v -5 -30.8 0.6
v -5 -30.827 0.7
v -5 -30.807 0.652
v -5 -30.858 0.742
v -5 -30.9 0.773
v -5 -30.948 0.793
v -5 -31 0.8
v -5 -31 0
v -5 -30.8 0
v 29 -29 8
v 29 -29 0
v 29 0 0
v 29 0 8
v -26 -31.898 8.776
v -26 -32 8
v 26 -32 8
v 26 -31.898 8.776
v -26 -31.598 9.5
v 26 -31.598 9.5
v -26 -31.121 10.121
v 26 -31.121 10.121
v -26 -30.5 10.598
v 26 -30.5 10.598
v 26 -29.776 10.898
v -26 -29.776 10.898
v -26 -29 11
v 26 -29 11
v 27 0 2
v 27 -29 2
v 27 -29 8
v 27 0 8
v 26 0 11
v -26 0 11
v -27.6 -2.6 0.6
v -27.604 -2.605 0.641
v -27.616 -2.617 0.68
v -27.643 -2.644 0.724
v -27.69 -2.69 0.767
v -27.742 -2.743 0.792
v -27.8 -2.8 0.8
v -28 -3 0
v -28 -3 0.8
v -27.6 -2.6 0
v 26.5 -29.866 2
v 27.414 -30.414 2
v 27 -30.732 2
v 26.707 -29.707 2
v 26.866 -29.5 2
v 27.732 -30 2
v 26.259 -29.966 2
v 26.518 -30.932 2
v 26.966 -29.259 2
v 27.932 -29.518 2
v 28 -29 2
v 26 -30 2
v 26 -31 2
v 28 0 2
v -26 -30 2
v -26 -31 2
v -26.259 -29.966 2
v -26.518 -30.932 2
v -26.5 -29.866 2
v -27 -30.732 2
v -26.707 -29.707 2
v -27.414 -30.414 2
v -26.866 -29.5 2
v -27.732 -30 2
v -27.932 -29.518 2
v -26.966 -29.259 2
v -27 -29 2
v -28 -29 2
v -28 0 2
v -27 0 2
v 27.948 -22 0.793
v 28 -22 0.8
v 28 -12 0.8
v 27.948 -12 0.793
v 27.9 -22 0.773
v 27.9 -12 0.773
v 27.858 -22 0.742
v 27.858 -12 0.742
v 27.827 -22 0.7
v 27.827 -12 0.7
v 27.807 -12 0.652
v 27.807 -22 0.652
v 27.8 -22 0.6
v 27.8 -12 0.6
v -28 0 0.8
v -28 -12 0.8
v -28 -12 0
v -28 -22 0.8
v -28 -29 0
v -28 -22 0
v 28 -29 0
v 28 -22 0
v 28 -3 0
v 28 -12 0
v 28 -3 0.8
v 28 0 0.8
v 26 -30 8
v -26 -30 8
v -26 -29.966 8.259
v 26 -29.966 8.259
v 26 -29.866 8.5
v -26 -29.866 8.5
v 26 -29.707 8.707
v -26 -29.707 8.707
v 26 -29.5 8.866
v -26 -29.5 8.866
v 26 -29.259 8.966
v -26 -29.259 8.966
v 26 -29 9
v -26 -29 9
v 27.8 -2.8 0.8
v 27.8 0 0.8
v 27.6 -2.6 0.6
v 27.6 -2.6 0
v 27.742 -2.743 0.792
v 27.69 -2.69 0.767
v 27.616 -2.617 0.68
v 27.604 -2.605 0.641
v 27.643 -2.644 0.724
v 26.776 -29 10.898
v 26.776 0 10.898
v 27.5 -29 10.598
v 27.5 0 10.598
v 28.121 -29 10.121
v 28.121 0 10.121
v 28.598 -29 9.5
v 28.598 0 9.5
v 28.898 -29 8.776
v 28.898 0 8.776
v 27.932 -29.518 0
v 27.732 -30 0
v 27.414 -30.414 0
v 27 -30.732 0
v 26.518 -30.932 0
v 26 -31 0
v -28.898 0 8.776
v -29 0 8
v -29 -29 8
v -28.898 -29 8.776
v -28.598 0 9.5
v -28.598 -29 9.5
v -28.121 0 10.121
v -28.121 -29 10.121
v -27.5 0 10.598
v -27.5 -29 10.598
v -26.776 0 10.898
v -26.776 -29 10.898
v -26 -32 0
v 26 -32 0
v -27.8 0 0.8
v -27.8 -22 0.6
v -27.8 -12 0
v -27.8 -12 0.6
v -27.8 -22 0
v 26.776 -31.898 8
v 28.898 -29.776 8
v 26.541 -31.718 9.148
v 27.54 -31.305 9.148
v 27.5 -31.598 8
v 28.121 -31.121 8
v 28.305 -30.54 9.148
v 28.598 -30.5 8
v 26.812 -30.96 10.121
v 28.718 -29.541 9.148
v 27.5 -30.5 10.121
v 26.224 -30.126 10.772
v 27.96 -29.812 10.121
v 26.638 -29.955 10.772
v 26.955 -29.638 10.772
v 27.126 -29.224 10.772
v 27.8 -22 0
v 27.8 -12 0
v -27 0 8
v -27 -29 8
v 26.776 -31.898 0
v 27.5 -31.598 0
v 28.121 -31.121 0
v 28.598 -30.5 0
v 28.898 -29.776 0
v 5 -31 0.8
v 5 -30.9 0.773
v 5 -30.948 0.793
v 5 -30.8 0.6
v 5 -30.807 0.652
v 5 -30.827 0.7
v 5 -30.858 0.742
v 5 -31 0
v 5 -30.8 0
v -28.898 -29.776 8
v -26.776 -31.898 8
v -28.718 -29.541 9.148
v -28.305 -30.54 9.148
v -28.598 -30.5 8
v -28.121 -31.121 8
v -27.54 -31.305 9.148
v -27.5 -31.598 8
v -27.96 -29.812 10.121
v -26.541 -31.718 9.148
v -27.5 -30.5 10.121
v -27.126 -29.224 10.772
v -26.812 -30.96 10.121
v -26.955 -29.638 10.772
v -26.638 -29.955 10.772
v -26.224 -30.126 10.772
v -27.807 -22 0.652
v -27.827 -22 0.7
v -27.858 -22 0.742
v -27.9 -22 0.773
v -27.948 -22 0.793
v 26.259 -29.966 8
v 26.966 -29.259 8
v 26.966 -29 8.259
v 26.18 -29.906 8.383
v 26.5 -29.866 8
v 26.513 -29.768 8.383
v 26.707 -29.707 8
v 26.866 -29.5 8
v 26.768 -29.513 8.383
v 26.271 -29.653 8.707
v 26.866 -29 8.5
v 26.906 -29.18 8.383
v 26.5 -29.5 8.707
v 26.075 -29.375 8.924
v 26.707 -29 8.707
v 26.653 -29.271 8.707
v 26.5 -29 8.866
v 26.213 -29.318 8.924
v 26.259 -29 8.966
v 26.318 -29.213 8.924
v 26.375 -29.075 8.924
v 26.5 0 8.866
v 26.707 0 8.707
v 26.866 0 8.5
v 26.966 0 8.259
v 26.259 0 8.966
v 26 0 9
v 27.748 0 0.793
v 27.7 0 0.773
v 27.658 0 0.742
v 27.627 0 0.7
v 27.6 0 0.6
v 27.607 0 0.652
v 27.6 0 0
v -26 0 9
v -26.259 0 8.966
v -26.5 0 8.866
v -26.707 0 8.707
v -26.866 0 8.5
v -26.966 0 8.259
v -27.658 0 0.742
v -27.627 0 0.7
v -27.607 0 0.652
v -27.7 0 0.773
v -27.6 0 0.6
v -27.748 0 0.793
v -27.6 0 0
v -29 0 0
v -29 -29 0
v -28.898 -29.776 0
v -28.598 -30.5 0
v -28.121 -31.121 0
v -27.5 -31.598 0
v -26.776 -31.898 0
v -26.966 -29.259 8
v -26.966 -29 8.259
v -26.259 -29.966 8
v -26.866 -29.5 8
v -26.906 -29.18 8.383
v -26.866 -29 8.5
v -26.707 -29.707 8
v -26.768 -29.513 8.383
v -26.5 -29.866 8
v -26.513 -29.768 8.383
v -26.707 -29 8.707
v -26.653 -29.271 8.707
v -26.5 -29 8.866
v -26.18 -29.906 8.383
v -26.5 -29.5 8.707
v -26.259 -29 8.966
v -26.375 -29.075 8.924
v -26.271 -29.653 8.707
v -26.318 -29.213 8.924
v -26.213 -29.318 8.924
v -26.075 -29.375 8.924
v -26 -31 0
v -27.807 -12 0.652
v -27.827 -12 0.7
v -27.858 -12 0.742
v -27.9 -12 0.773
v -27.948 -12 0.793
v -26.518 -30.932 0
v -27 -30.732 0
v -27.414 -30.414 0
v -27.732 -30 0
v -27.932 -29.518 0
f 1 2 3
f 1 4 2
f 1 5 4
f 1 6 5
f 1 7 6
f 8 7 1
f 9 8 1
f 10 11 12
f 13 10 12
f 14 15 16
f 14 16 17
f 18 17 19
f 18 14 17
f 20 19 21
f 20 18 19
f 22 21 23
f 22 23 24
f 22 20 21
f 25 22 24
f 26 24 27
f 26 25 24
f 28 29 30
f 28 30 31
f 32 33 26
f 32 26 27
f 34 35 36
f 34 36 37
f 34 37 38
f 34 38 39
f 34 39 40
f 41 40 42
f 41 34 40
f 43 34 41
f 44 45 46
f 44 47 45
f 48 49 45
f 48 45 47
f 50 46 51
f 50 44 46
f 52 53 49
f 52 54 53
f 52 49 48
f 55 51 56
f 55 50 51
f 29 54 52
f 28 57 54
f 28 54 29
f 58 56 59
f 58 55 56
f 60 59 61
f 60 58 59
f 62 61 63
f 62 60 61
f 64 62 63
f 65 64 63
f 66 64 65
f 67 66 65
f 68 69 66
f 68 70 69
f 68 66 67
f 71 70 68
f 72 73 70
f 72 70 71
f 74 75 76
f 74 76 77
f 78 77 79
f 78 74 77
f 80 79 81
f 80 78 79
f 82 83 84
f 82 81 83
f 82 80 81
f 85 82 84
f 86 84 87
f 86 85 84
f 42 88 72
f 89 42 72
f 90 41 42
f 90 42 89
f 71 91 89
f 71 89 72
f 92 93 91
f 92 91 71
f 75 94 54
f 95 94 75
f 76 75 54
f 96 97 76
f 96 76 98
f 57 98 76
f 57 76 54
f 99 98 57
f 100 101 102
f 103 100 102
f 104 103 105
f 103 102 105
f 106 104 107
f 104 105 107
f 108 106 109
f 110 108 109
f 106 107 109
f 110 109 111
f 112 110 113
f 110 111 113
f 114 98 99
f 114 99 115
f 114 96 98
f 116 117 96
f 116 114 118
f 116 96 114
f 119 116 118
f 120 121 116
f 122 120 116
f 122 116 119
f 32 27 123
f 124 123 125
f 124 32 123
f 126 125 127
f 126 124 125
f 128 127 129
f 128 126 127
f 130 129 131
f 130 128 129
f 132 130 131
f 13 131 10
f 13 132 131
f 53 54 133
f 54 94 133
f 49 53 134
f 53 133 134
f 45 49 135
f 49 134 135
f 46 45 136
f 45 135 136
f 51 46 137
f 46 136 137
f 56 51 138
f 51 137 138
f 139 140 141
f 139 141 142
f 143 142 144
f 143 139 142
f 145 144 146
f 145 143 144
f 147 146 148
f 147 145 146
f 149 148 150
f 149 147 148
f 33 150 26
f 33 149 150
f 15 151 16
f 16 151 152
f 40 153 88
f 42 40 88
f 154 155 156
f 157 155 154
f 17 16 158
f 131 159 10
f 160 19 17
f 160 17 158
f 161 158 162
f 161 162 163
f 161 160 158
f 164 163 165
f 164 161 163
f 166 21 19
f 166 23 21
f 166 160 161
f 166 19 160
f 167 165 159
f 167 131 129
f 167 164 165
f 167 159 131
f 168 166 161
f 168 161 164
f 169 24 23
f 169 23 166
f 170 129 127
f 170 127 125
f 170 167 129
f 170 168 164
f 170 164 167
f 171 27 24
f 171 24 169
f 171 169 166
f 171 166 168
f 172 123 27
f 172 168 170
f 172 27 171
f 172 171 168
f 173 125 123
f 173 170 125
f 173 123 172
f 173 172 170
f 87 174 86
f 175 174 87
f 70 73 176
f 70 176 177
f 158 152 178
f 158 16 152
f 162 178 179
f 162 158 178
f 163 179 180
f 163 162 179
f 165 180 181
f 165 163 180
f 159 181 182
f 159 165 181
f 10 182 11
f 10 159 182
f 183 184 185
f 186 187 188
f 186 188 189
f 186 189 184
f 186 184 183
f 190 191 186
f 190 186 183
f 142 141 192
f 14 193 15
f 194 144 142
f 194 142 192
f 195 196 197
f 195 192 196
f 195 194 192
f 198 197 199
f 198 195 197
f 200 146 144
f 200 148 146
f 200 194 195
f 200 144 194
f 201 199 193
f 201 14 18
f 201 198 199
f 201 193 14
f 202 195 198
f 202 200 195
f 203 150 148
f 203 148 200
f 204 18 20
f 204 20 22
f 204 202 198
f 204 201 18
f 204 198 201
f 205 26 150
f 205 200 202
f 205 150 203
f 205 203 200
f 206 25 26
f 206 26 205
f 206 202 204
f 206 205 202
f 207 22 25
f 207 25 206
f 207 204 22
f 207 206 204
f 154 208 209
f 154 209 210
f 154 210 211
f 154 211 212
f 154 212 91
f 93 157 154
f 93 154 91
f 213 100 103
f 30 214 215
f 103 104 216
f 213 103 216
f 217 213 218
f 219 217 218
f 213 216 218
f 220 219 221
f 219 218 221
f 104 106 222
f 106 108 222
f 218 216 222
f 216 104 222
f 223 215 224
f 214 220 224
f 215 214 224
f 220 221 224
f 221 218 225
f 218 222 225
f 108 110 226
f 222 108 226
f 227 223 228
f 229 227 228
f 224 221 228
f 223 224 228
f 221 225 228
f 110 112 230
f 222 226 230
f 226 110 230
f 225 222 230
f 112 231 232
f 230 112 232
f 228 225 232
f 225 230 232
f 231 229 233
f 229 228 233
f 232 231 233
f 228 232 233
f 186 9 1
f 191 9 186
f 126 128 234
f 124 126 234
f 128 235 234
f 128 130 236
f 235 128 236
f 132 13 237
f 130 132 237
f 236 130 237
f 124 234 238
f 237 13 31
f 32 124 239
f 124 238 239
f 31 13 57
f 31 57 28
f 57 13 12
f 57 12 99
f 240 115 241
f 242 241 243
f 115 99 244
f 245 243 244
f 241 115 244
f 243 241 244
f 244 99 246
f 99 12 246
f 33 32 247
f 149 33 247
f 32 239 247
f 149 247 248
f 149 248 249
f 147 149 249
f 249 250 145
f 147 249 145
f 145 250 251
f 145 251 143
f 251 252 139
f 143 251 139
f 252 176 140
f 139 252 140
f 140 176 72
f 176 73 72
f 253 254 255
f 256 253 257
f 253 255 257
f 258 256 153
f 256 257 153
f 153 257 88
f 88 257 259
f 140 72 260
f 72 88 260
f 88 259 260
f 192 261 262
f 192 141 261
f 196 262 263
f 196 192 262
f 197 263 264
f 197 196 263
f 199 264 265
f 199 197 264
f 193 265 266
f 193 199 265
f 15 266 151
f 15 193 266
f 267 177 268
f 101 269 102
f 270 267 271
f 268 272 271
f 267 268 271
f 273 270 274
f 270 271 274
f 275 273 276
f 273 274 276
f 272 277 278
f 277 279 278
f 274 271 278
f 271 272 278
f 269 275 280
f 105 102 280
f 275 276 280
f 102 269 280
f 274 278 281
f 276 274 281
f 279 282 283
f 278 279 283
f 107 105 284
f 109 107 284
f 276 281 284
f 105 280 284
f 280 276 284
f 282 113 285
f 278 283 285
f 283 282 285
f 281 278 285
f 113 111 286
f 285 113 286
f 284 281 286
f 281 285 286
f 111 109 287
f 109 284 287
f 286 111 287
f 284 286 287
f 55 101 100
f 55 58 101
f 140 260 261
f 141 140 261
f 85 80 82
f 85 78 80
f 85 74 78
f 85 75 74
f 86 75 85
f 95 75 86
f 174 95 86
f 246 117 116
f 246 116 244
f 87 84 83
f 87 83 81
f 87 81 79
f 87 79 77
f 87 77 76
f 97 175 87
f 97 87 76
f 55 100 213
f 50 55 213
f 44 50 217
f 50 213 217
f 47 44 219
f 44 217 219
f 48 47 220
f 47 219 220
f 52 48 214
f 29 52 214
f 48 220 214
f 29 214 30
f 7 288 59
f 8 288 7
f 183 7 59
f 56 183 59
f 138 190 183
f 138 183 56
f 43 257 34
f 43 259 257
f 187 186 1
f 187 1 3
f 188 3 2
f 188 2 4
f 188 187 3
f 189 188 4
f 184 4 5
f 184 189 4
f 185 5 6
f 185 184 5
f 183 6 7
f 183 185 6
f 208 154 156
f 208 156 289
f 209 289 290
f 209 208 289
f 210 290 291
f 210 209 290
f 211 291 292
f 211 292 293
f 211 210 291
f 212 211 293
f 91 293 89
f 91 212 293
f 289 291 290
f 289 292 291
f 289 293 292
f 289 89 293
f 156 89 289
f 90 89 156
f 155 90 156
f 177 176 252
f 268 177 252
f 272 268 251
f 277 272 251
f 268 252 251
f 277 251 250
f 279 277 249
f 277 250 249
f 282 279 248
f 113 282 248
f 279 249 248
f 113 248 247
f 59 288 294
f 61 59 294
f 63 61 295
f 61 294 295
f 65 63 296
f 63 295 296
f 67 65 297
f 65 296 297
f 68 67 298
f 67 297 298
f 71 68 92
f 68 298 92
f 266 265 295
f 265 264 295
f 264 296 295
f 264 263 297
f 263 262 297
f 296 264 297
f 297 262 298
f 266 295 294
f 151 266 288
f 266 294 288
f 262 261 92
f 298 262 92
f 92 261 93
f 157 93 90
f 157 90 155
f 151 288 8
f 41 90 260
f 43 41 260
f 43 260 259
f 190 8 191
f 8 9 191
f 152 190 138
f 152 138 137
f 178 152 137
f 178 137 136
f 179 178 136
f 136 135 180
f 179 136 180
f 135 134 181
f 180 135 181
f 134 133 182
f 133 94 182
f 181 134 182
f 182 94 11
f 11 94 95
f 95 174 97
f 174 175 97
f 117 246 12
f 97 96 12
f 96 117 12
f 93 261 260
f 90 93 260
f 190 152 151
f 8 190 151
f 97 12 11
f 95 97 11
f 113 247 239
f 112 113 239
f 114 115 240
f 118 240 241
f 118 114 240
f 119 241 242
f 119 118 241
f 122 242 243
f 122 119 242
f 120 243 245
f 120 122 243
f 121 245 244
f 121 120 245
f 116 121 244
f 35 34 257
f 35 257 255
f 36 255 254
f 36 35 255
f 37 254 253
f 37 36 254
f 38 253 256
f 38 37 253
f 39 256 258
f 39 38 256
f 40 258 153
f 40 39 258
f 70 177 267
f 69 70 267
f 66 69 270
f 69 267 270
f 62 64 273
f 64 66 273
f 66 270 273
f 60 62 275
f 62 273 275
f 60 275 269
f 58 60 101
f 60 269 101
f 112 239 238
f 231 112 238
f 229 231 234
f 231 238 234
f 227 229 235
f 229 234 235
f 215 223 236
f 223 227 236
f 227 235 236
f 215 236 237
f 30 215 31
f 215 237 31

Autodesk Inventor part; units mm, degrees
ref_plane "YZ Plane" through (0, 0, 0) normal (1, 0, 0) x (0, 1, 0)
ref_plane "XZ Plane" through (0, 0, 0) normal (0, 1, 0) x (-1, 0, 0)
ref_plane "XY Plane" through (0, 0, 0) normal (0, 0, 1) x (1, 0, 0)
sketch "Sketch1" plane through (0, 0, 0) normal (0, 0, 1) x (1, 0, 0)
  line L0 (-34.8, 0) -> (5.8, 0) construction
  line L1 (0, -38.4) -> (0, 6.4) construction
  line L2 (0, 0) -> (-29, 0)
  line L3 (-29, 0) -> (-29, -32)
  line L4 (-29, -32) -> (0, -32)
  line L5 (0, -32) -> (0, 0)
  dimension "d0" = 29
  dimension "d1" = 32
extrude "Extrusion1" add sketch "Sketch1" along normal blind 11
fillet "Fillet1" radius 3 1 edges at (-29, -32, 5.5)
fillet "Fillet2" radius 3 3 edges at (-28.1213, -31.1213, 11) (-29, -14.5, 11) (-13, -32, 11)
shell "Shell1" thickness 2 removed faces 3 at (-9.6667, -20.3333, 0) at (0, -20.3333, 3.6667) at (-18.3333, 0, 3.6667)
sketch "Sketch3" plane through (0, 0, 0) normal (0, 0, -1) x (-1, 0, 0)
  line L0 (27, 0) -> (27, -29) projected
  arc A0 (26, -30) -> (27, -29) centre (26, -29) ccw projected
  line L1 (26, -30) -> (0, -30) projected
  line L2 (28, 0) -> (28, -29)
  arc A1 (26, -31) -> (28, -29) centre (26, -29) ccw
  line L3 (26, -31) -> (0, -31)
  line L4 (27, 0) -> (28, 0)
  line L5 (0, -30) -> (0, -31)
  point P0 (0, 0)
  dimension "d19" = 1
extrude "Extrusion3" cut sketch "Sketch3" against normal blind 2
sketch "Sketch4" plane through (0, 0, 0) normal (0, 0, -1) x (-1, 0, 0)
  line L0 (0, -31) -> (26, -31) construction
  arc A0 (26, -31) -> (28, -29) centre (26, -29) ccw construction
  line L1 (28, -29) -> (28, 0) construction
  line L2 (28, 0) -> (29, 0) construction
  line L3 (29, 0) -> (29, -29) construction
  arc A1 (26, -32) -> (29, -29) centre (26, -29) ccw construction
  line L4 (26, -32) -> (0, -32) construction
  line L5 (0, -32) -> (0, -31) construction
  line L6 (28, 0) -> (27.6, 0)
  line L7 (27.6, 0) -> (27.6, -3)
  line L8 (27.6, -3) -> (28, -3)
  line L9 (28, -3) -> (28, 0)
  line L10 (28, -12) -> (27.8, -12)
  line L11 (27.8, -12) -> (27.8, -22)
  line L12 (27.8, -22) -> (28, -22)
  line L13 (28, -22) -> (28, -12)
  line L14 (0, -31) -> (5, -31)
  line L15 (5, -31) -> (5, -30.8)
  line L16 (5, -30.8) -> (0, -30.8)
  line L17 (0, -30.8) -> (0, -31)
  point P0 (0, 0)
  dimension "d22" = 5
  dimension "d23" = 0.2
  dimension "d24" = 0.2
  dimension "d25" = 10
  dimension "d26" = 10
  dimension "d27" = 3
  dimension "d28" = 0.4
extrude "Extrusion4" add sketch "Sketch4" against normal blind 0.8
chamfer "Chamfer2" distance 0.4 angle 45 1 edges at (-27.6, -3, 0.4)
fillet "Fillet4" radius 0.2 3 edges at (-27.6, -1.3002, 0.8) (-27.8, -17, 0.8) (-2.5, -30.8, 0.8)
mirror "Mirror1" about plane through (0, -32, 0) normal (1, 0, 0)
properties part number "P128" material "ABS Plastic"
